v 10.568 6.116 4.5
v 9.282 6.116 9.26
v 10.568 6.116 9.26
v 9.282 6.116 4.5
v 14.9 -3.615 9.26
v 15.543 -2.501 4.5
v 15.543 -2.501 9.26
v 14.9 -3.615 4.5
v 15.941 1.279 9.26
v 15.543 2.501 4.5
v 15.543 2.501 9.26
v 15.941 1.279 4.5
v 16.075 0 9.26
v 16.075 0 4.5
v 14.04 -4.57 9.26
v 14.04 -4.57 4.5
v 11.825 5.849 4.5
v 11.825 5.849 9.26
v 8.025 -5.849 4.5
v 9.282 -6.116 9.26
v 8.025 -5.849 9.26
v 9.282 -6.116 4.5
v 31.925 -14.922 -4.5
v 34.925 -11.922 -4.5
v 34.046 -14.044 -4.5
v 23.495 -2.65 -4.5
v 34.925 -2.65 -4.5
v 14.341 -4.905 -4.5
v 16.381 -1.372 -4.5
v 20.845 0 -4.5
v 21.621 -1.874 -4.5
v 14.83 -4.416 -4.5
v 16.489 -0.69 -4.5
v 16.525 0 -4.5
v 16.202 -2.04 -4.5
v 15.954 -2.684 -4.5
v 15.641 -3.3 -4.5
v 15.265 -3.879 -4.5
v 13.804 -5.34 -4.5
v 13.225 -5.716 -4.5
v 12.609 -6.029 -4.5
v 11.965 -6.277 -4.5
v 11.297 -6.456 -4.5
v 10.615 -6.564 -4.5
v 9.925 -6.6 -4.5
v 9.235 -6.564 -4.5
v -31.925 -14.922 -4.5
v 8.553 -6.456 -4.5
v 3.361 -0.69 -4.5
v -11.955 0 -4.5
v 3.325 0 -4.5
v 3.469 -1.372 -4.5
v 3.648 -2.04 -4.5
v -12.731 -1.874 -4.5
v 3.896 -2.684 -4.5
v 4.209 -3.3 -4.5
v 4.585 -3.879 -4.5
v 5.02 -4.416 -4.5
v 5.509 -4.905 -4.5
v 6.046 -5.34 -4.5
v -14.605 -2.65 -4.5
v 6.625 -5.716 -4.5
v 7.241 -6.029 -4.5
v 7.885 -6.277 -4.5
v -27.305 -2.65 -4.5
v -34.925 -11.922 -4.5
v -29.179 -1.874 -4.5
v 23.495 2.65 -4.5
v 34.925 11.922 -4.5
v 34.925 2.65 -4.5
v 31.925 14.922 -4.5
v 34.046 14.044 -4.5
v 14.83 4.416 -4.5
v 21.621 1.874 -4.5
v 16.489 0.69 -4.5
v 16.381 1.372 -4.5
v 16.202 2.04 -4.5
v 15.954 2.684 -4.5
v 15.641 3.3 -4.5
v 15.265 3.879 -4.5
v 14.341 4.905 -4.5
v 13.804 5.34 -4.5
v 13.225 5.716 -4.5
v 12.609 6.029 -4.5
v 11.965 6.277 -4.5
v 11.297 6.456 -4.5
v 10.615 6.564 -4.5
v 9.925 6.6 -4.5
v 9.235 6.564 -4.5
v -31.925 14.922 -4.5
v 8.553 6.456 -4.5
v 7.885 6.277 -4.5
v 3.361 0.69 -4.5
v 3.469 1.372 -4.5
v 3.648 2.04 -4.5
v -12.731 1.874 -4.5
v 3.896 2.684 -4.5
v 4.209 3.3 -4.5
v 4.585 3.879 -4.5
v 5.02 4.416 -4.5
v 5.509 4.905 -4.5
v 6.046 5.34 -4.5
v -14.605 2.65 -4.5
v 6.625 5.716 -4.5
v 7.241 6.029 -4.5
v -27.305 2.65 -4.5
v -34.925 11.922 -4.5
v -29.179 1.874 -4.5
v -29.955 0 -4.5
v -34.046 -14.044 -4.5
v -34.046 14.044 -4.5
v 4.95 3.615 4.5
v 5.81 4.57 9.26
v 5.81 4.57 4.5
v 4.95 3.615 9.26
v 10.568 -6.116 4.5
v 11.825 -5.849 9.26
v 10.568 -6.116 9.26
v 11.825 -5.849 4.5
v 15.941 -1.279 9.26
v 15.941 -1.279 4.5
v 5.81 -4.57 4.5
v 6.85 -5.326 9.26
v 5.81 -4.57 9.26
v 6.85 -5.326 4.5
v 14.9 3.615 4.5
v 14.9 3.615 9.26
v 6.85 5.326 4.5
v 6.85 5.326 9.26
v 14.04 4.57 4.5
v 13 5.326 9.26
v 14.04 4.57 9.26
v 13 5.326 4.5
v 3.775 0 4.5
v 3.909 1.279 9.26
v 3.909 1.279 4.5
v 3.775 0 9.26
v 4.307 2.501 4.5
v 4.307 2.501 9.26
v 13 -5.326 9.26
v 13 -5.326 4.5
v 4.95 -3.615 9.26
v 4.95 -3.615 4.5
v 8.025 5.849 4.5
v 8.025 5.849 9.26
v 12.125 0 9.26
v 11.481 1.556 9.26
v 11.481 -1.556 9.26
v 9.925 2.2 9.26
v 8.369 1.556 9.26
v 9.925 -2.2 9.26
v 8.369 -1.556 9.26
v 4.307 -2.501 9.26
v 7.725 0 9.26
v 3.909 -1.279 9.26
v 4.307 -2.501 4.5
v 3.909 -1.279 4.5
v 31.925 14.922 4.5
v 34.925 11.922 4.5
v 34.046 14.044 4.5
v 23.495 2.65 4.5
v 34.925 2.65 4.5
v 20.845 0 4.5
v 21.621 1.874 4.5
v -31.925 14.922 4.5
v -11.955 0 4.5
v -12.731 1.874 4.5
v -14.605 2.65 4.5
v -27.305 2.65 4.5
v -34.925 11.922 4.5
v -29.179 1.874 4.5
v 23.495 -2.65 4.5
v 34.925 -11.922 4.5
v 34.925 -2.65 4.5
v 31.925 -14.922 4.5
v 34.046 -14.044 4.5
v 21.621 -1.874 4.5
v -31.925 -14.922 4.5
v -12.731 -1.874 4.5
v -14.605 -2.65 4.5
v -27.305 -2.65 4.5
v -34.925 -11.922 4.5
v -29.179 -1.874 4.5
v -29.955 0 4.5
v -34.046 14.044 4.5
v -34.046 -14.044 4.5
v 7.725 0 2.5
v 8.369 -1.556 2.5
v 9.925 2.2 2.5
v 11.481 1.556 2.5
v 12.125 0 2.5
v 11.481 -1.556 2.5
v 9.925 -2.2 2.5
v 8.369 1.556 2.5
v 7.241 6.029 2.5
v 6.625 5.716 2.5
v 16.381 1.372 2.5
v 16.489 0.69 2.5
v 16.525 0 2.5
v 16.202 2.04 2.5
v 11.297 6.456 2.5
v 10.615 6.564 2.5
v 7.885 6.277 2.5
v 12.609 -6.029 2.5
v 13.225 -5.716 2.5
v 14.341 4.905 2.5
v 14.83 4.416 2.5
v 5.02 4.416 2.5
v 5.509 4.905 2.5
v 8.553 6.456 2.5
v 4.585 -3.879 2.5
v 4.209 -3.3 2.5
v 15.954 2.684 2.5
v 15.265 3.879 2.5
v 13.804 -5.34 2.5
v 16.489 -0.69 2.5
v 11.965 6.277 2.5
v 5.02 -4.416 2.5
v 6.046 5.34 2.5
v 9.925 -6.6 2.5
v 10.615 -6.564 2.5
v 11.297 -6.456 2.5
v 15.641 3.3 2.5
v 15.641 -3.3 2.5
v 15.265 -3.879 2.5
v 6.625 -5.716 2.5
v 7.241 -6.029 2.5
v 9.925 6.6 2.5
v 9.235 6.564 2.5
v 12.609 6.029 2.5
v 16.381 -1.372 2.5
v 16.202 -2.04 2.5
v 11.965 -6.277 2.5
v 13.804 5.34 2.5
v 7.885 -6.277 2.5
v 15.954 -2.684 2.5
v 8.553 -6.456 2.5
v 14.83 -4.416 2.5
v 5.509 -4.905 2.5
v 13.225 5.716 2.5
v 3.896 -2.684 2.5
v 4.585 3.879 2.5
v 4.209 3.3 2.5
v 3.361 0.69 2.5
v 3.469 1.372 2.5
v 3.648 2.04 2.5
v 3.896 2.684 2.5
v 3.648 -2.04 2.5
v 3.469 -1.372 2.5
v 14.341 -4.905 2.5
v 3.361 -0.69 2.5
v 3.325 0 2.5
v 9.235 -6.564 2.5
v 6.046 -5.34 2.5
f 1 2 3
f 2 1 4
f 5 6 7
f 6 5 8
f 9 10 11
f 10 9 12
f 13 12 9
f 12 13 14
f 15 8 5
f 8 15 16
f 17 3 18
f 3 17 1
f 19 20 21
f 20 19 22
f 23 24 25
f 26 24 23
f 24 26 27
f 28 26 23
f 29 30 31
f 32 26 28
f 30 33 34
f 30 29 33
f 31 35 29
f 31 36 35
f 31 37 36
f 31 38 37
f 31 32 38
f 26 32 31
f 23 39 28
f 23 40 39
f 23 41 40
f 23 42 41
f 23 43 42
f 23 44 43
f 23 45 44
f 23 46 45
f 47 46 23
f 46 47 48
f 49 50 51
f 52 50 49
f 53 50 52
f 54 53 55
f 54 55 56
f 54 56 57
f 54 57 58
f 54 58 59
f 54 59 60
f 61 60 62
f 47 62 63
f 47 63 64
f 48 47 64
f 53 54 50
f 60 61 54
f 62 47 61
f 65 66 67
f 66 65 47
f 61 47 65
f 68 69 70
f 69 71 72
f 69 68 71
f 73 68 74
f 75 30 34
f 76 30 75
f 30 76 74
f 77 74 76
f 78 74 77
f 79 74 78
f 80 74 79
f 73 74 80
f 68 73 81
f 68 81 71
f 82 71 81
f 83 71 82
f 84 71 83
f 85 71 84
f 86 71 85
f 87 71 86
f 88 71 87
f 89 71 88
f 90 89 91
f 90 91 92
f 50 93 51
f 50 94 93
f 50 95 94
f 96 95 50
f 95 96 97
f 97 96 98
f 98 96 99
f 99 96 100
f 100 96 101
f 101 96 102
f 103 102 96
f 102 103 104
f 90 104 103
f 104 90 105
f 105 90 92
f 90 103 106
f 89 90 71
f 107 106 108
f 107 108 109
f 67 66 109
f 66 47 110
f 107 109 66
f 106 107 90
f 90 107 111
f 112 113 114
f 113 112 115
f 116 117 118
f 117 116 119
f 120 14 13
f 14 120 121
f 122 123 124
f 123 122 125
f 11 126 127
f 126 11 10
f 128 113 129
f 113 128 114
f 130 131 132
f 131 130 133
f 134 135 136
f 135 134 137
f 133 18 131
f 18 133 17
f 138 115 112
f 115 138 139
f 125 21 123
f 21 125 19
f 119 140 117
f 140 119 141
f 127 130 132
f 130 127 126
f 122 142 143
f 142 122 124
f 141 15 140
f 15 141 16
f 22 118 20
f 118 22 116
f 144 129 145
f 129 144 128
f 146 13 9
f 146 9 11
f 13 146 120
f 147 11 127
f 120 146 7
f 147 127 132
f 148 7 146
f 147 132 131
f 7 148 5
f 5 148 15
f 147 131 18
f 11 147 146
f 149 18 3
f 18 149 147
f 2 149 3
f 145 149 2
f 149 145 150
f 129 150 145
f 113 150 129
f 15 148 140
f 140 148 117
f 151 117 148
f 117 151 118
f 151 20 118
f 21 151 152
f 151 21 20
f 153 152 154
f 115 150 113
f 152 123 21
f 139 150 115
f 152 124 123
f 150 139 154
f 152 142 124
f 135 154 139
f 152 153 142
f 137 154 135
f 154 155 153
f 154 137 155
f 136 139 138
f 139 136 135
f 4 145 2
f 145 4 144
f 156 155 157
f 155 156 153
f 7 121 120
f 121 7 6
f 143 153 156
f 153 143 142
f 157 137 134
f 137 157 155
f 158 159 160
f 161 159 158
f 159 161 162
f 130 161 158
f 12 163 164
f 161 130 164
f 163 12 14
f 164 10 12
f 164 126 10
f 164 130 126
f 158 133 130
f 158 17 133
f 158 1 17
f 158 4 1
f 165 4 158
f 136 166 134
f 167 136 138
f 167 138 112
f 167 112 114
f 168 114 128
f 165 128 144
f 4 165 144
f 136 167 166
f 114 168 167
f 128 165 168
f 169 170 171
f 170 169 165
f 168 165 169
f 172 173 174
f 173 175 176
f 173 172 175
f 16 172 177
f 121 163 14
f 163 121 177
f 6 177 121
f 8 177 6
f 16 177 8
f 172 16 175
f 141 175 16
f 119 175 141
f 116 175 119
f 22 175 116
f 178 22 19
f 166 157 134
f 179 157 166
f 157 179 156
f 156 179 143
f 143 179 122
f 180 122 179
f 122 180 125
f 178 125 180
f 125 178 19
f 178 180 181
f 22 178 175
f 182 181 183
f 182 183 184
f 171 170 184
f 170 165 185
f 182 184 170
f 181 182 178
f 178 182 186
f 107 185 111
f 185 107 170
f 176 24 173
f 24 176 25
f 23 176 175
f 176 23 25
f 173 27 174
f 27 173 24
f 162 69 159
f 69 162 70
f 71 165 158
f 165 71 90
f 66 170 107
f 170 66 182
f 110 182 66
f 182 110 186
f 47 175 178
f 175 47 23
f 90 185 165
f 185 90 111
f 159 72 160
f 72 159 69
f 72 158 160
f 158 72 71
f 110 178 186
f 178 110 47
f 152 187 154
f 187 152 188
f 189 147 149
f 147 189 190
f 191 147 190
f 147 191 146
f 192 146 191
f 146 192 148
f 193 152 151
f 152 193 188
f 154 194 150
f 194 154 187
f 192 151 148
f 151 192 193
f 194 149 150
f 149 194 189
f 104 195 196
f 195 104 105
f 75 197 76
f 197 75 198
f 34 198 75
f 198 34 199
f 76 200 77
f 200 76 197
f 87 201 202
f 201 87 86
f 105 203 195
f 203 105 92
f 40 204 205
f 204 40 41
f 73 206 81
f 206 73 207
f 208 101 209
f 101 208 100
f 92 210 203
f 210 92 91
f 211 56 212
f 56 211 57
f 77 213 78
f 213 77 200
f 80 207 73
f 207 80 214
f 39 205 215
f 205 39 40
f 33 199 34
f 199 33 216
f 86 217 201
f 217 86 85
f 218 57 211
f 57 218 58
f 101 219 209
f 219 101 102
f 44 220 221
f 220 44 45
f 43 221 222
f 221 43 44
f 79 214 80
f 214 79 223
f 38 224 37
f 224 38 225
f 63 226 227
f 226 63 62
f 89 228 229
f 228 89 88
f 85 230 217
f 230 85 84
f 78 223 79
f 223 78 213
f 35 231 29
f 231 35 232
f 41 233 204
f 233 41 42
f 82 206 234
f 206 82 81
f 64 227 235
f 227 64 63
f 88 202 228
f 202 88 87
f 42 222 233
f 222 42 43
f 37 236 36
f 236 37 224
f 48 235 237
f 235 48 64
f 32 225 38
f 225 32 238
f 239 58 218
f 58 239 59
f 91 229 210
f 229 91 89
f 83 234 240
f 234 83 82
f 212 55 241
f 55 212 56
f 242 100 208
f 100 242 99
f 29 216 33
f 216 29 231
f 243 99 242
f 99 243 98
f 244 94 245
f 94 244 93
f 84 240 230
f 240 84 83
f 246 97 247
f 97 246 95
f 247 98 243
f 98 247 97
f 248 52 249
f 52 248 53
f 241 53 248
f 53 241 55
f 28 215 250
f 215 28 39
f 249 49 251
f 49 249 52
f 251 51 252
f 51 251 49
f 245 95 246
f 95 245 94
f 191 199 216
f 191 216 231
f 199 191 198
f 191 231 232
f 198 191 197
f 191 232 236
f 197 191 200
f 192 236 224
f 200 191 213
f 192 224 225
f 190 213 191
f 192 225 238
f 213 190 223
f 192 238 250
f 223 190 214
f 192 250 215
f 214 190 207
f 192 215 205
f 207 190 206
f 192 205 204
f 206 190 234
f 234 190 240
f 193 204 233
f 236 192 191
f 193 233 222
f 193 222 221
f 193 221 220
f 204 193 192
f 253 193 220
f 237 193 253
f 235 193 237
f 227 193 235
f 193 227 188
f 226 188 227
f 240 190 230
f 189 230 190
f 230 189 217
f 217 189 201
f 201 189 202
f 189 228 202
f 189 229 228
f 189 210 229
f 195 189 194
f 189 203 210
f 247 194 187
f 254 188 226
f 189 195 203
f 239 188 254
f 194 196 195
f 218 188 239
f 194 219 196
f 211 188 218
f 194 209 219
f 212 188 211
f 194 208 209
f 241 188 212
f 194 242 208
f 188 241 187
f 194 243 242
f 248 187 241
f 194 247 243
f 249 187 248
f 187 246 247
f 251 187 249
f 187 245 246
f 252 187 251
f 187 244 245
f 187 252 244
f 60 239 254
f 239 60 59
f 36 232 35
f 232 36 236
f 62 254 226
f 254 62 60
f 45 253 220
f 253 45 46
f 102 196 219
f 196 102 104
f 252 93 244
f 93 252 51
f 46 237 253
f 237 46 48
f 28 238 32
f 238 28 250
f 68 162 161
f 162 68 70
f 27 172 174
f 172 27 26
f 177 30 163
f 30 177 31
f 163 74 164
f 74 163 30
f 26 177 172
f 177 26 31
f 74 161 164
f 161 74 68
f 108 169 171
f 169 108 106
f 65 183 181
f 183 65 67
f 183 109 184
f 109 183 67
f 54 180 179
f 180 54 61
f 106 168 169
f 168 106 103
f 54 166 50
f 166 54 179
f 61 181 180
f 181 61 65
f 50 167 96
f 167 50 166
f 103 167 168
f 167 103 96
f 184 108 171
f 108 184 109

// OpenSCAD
// file: inc/configuration.scad
// Copyright (C) 2012 Joseph Lenox
// HexyDelta 

//==========================================================================//
// Configuration file for HexyDelta OpenSCAD files                          //
// Scroll past the definition section to change basic and advanced settings //
//==========================================================================//

//====================//
// Definition Section //
//====================//

// Print the hole_calibration.scad object to dial in the next 6 settings
// Google found http://www.fairburyfastener.com/xdims_metric_nuts.htm
M8=8.4;// diameter of M8 threaded rod
M5=5.3;// diameter of M5 threaded rod
M3=3.4;// diameter of M3 threaded rod
M2_5=2.7; // diameter of M2.5 threaded rod
M8nut=13;// diameter of M8 nut flat to flat
M5nut=8;// diameter of M5 nut flat to flat
M3nut=5.6;// diameter of M3 nut flat to flat

M8nutThickness=6.8;// thickness of a standard M8 nut(nylock is 8mm)
M5nutThickness=4.7;// thickness of a standard M5 nut(nylock is 5mm)
M3nutThickness=2.4;// thickness of a standard M3 nut

// Acme Linear Screw and Nut
ACME14=6.5;// diameter of 1/4 inch ACME threaded rod in mm
ACME14nut=12.8;// diameter of ACME 1/4 inch nut flat to flat in mm
ACME14nutThickness=6.5;// thickness of ACME 1/4 inch nut in mm

//rotary bearings
// format is IDxODxL
xx623=[3, 10, 4];
xx625=[5, 16, 6];
MF204=[4, 10, 4];
MF126=[6, 12, 4];
rotaryBearing=xx623;// for readability(can be changed if other bearings are used


//=======================//
//  Basic Config Items   //
//=======================//

count=6;
//=======================//
// Advanced Config Items //
//=======================//
$fn=8;		// default resolution for parts, decrease if part compiling or stl/gcode is unmanageable
plate_dia = 25.4*(8.5 + (1.5/12));
inset_hole=3.3+1.5;
inset_hole_r = (plate_dia / 2 ) - inset_hole;
base_thickness=5;
height=40 + base_thickness;
track=[17.4,24.5, height];
track_thickness = 3.1;
center=25;
mounting_screw_dia = 3.4;
plate_length=55;

tolerance=0.2;
// main file
h=1.175*25.4;
w=2.750*25.4;
head=12;
plate=9;
center=1.175*25.4;
ptc_r=6.5;
left_hole=0.45*25.4;
right_hole_1=0.8*25.4;
right_hole_2=0.3*25.4;

difference() {
    union() {
        translate([-(center-(w/2)),0,-plate/2])
            cylinder(d=head+0.3, h=4.76+plate,$fn=30);
        roundcube([w,h,plate],center=true);
    }
    #translate([-(center-(w/2)),0,-plate/2])
    {
        cylinder(d=4.1+0.3, h=4.76+plate);
        cylinder(r=ptc_r+0.1, h=7, $fn=60);
    }
    #translate([-(left_hole-(w/2)),0,-plate/2])
    hull() {
        cylinder(d=M5, h=4.76+plate);
        translate([12,0,0])cylinder(d=M5, h=4.76+plate);
        }
    #translate([(right_hole_1-(w/2)),0,-plate/2])
    #hull() {
        cylinder(d=M5, h=4.76+plate);
        translate([right_hole_2-right_hole_1,0,0]) 
        cylinder(d=M5, h=4.76+plate);
    }
}



use <inc/functions.scad>
include<inc/configuration.scad>
